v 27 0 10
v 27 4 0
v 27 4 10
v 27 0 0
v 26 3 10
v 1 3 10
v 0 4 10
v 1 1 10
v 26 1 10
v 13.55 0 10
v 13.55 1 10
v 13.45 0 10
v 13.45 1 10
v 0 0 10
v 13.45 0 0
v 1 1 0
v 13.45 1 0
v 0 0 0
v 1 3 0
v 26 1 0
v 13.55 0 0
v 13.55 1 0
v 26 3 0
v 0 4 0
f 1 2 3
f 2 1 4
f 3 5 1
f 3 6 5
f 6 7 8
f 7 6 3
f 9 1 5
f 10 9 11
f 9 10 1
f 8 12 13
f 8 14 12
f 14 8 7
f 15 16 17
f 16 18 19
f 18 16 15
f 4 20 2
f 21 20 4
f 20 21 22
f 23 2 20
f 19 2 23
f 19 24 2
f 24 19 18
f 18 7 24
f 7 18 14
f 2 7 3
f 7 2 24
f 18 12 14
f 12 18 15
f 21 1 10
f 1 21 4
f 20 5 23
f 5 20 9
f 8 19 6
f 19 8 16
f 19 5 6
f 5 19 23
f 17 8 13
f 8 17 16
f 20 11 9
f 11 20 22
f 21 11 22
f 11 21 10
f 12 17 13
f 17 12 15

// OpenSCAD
// =============================================
// 3D: Ventilation cover (square tube with back slit)
// Версия: v1.0 — initial model: 127x127 inner, h=250, wall=0.8, back slit
// =============================================

// Short description for models table
description = "Ventilation cover: square tube 127x127x250, wall 0.8, back slit";

use <../modules.scad>;

// ===== Точность аппроксимации окружностей =====
$fn = 0;        // фиксированную сегментацию отключаем
$fa = 6;        // 5–8° обычно достаточно
$fs = 0.35;     // ≈ диаметр сопла (0.3–0.5 для сопла 0.4)
pin_fs = 0.25;  // чуть тоньше для штырей и отверстий

// ===== Режим печати тест‑фрагментов =====
test_fragment = false;   // true — печатать только угловой фрагмент
frag_size     = 200;      // размер квадрата вырезки, мм
frag_index    = 0;       // 0=НЛ, 1=ВЛ, 2=НП, 3=ВП (относительно основания)
frag_gap_x    = 10;      // зазор между фрагментами по X, мм (не используется в этой модели)
frag_h_extra  = -110;      // запас по высоте клипа, мм

// ===== Общие доп. параметры =====
tiny = 0.1;              // небольшой зазор для булевых операций
edge_chamfer_z = 1;      // высота фаски по Z (мм)
edge_chamfer_x = 5;      // горизонтальный вылет фаски по X (с каждой стороны), мм
edge_chamfer_y = 5;      // горизонтальный вылет фаски по Y (с каждой стороны), мм
screen_frame_gap = 0.2;  // только для высоты вычитаний (не влияет на XY)

// ===== Параметры модели =====
inner_x_mm = 25;        // внутренний размер по X, мм
inner_y_mm = 2;        // внутренний размер по Y, мм
cover_h_mm = 10;        // высота по Z, мм
wall_th_mm = 1;        // толщина стенок, мм

back_slit_enable = true; // разрез задней стенки по центру
back_slit_gap_mm = 0.1;  // ширина разреза, мм

// ===== Вычисляемые размеры =====
outer_x_mm = inner_x_mm + 2 * wall_th_mm;
outer_y_mm = inner_y_mm + 2 * wall_th_mm;

// ===== Комментарии ===========================
/*
Модель: вентиляционный кожух (тонкостенная квадратная труба) без крышек сверху/снизу.

Фрагменты:
- base: основная деталь (4 стенки) с разрезом на задней стенке

План:
- Делается оболочка как разность outer_box - inner_box.
- Разрез задней стенки: щель шириной back_slit_gap_mm по центру X, только в зоне задней стенки (Y≈0..wall_th).
- По нижней кромке можно включить фаску через edge_chamfer_* (значения автоматически ограничиваются толщиной стенки).
*/

// ===== Вспомогательные функции ====================
function clamp01(v) = clamp(v, 0, 1);

// ===== Вспомогательные модули ====================
// Wedge along X: triangle in (Y,Z), extruded along X
module wedge_along_x(len_x, depth_y, height_z) {
  rotate([0, 90, 0])
    linear_extrude(height=len_x)
      polygon(points=[
        [0, 0],          // z=0, y=0
        [0, depth_y],    // z=0, y=depth
        [height_z, 0]    // z=height, y=0
      ]);
}

// Wedge along Y: triangle in (X,Z), extruded along Y
module wedge_along_y(len_y, depth_x, height_z) {
  rotate([-90, 0, 0])
    linear_extrude(height=len_y)
      polygon(points=[
        [0, 0],          // x=0, z=0
        [depth_x, 0],    // x=depth, z=0
        [0, height_z]    // x=0, z=height
      ]);
}

// ===== Модули деталей ====================
module base_shell() {
  difference() {
    cube([outer_x_mm, outer_y_mm, cover_h_mm], center=false);
    translate([wall_th_mm, wall_th_mm, -tiny])
      cube([inner_x_mm, inner_y_mm, cover_h_mm + 2*tiny], center=false);
  }
}

module back_slit_cut() {
  if (back_slit_enable) {
    x0 = outer_x_mm/2 - back_slit_gap_mm/2;
    translate([x0, -tiny, -tiny])
      cube([back_slit_gap_mm, wall_th_mm + 2*tiny, cover_h_mm + 2*tiny], center=false);
  }
}

module bottom_chamfer_cuts() {
  chz = clamp(edge_chamfer_z, 0, cover_h_mm/2);
  chx = clamp(edge_chamfer_x, 0, wall_th_mm);
  chy = clamp(edge_chamfer_y, 0, wall_th_mm);

  if (chz > 0) {
    union() {
      if (chy > 0) {
        // back + front
        translate([0, 0, 0]) wedge_along_x(outer_x_mm, chy, chz);
        translate([0, outer_y_mm - chy, 0]) wedge_along_x(outer_x_mm, chy, chz);
      }
      if (chx > 0) {
        // left + right
        translate([0, 0, 0]) wedge_along_y(outer_y_mm, chx, chz);
        translate([outer_x_mm - chx, 0, 0]) wedge_along_y(outer_y_mm, chx, chz);
      }
    }
  }
}

// Основная деталь
module base() {
  difference() {
    difference() {
      base_shell();
      back_slit_cut();
    }
    bottom_chamfer_cuts();
  }
}

// ===== Вывод всех фрагментов ====================
module show_all() {
  clip_for_fragments_bbox(
    outer_x_mm,
    outer_y_mm,
    cover_h_mm,
    enabled=test_fragment,
    frag_size=frag_size,
    frag_index=frag_index,
    frag_h_extra=frag_h_extra
  ) base();
}

// ===== Точка входа ====================
module main() {
  show_all();
}

main();
